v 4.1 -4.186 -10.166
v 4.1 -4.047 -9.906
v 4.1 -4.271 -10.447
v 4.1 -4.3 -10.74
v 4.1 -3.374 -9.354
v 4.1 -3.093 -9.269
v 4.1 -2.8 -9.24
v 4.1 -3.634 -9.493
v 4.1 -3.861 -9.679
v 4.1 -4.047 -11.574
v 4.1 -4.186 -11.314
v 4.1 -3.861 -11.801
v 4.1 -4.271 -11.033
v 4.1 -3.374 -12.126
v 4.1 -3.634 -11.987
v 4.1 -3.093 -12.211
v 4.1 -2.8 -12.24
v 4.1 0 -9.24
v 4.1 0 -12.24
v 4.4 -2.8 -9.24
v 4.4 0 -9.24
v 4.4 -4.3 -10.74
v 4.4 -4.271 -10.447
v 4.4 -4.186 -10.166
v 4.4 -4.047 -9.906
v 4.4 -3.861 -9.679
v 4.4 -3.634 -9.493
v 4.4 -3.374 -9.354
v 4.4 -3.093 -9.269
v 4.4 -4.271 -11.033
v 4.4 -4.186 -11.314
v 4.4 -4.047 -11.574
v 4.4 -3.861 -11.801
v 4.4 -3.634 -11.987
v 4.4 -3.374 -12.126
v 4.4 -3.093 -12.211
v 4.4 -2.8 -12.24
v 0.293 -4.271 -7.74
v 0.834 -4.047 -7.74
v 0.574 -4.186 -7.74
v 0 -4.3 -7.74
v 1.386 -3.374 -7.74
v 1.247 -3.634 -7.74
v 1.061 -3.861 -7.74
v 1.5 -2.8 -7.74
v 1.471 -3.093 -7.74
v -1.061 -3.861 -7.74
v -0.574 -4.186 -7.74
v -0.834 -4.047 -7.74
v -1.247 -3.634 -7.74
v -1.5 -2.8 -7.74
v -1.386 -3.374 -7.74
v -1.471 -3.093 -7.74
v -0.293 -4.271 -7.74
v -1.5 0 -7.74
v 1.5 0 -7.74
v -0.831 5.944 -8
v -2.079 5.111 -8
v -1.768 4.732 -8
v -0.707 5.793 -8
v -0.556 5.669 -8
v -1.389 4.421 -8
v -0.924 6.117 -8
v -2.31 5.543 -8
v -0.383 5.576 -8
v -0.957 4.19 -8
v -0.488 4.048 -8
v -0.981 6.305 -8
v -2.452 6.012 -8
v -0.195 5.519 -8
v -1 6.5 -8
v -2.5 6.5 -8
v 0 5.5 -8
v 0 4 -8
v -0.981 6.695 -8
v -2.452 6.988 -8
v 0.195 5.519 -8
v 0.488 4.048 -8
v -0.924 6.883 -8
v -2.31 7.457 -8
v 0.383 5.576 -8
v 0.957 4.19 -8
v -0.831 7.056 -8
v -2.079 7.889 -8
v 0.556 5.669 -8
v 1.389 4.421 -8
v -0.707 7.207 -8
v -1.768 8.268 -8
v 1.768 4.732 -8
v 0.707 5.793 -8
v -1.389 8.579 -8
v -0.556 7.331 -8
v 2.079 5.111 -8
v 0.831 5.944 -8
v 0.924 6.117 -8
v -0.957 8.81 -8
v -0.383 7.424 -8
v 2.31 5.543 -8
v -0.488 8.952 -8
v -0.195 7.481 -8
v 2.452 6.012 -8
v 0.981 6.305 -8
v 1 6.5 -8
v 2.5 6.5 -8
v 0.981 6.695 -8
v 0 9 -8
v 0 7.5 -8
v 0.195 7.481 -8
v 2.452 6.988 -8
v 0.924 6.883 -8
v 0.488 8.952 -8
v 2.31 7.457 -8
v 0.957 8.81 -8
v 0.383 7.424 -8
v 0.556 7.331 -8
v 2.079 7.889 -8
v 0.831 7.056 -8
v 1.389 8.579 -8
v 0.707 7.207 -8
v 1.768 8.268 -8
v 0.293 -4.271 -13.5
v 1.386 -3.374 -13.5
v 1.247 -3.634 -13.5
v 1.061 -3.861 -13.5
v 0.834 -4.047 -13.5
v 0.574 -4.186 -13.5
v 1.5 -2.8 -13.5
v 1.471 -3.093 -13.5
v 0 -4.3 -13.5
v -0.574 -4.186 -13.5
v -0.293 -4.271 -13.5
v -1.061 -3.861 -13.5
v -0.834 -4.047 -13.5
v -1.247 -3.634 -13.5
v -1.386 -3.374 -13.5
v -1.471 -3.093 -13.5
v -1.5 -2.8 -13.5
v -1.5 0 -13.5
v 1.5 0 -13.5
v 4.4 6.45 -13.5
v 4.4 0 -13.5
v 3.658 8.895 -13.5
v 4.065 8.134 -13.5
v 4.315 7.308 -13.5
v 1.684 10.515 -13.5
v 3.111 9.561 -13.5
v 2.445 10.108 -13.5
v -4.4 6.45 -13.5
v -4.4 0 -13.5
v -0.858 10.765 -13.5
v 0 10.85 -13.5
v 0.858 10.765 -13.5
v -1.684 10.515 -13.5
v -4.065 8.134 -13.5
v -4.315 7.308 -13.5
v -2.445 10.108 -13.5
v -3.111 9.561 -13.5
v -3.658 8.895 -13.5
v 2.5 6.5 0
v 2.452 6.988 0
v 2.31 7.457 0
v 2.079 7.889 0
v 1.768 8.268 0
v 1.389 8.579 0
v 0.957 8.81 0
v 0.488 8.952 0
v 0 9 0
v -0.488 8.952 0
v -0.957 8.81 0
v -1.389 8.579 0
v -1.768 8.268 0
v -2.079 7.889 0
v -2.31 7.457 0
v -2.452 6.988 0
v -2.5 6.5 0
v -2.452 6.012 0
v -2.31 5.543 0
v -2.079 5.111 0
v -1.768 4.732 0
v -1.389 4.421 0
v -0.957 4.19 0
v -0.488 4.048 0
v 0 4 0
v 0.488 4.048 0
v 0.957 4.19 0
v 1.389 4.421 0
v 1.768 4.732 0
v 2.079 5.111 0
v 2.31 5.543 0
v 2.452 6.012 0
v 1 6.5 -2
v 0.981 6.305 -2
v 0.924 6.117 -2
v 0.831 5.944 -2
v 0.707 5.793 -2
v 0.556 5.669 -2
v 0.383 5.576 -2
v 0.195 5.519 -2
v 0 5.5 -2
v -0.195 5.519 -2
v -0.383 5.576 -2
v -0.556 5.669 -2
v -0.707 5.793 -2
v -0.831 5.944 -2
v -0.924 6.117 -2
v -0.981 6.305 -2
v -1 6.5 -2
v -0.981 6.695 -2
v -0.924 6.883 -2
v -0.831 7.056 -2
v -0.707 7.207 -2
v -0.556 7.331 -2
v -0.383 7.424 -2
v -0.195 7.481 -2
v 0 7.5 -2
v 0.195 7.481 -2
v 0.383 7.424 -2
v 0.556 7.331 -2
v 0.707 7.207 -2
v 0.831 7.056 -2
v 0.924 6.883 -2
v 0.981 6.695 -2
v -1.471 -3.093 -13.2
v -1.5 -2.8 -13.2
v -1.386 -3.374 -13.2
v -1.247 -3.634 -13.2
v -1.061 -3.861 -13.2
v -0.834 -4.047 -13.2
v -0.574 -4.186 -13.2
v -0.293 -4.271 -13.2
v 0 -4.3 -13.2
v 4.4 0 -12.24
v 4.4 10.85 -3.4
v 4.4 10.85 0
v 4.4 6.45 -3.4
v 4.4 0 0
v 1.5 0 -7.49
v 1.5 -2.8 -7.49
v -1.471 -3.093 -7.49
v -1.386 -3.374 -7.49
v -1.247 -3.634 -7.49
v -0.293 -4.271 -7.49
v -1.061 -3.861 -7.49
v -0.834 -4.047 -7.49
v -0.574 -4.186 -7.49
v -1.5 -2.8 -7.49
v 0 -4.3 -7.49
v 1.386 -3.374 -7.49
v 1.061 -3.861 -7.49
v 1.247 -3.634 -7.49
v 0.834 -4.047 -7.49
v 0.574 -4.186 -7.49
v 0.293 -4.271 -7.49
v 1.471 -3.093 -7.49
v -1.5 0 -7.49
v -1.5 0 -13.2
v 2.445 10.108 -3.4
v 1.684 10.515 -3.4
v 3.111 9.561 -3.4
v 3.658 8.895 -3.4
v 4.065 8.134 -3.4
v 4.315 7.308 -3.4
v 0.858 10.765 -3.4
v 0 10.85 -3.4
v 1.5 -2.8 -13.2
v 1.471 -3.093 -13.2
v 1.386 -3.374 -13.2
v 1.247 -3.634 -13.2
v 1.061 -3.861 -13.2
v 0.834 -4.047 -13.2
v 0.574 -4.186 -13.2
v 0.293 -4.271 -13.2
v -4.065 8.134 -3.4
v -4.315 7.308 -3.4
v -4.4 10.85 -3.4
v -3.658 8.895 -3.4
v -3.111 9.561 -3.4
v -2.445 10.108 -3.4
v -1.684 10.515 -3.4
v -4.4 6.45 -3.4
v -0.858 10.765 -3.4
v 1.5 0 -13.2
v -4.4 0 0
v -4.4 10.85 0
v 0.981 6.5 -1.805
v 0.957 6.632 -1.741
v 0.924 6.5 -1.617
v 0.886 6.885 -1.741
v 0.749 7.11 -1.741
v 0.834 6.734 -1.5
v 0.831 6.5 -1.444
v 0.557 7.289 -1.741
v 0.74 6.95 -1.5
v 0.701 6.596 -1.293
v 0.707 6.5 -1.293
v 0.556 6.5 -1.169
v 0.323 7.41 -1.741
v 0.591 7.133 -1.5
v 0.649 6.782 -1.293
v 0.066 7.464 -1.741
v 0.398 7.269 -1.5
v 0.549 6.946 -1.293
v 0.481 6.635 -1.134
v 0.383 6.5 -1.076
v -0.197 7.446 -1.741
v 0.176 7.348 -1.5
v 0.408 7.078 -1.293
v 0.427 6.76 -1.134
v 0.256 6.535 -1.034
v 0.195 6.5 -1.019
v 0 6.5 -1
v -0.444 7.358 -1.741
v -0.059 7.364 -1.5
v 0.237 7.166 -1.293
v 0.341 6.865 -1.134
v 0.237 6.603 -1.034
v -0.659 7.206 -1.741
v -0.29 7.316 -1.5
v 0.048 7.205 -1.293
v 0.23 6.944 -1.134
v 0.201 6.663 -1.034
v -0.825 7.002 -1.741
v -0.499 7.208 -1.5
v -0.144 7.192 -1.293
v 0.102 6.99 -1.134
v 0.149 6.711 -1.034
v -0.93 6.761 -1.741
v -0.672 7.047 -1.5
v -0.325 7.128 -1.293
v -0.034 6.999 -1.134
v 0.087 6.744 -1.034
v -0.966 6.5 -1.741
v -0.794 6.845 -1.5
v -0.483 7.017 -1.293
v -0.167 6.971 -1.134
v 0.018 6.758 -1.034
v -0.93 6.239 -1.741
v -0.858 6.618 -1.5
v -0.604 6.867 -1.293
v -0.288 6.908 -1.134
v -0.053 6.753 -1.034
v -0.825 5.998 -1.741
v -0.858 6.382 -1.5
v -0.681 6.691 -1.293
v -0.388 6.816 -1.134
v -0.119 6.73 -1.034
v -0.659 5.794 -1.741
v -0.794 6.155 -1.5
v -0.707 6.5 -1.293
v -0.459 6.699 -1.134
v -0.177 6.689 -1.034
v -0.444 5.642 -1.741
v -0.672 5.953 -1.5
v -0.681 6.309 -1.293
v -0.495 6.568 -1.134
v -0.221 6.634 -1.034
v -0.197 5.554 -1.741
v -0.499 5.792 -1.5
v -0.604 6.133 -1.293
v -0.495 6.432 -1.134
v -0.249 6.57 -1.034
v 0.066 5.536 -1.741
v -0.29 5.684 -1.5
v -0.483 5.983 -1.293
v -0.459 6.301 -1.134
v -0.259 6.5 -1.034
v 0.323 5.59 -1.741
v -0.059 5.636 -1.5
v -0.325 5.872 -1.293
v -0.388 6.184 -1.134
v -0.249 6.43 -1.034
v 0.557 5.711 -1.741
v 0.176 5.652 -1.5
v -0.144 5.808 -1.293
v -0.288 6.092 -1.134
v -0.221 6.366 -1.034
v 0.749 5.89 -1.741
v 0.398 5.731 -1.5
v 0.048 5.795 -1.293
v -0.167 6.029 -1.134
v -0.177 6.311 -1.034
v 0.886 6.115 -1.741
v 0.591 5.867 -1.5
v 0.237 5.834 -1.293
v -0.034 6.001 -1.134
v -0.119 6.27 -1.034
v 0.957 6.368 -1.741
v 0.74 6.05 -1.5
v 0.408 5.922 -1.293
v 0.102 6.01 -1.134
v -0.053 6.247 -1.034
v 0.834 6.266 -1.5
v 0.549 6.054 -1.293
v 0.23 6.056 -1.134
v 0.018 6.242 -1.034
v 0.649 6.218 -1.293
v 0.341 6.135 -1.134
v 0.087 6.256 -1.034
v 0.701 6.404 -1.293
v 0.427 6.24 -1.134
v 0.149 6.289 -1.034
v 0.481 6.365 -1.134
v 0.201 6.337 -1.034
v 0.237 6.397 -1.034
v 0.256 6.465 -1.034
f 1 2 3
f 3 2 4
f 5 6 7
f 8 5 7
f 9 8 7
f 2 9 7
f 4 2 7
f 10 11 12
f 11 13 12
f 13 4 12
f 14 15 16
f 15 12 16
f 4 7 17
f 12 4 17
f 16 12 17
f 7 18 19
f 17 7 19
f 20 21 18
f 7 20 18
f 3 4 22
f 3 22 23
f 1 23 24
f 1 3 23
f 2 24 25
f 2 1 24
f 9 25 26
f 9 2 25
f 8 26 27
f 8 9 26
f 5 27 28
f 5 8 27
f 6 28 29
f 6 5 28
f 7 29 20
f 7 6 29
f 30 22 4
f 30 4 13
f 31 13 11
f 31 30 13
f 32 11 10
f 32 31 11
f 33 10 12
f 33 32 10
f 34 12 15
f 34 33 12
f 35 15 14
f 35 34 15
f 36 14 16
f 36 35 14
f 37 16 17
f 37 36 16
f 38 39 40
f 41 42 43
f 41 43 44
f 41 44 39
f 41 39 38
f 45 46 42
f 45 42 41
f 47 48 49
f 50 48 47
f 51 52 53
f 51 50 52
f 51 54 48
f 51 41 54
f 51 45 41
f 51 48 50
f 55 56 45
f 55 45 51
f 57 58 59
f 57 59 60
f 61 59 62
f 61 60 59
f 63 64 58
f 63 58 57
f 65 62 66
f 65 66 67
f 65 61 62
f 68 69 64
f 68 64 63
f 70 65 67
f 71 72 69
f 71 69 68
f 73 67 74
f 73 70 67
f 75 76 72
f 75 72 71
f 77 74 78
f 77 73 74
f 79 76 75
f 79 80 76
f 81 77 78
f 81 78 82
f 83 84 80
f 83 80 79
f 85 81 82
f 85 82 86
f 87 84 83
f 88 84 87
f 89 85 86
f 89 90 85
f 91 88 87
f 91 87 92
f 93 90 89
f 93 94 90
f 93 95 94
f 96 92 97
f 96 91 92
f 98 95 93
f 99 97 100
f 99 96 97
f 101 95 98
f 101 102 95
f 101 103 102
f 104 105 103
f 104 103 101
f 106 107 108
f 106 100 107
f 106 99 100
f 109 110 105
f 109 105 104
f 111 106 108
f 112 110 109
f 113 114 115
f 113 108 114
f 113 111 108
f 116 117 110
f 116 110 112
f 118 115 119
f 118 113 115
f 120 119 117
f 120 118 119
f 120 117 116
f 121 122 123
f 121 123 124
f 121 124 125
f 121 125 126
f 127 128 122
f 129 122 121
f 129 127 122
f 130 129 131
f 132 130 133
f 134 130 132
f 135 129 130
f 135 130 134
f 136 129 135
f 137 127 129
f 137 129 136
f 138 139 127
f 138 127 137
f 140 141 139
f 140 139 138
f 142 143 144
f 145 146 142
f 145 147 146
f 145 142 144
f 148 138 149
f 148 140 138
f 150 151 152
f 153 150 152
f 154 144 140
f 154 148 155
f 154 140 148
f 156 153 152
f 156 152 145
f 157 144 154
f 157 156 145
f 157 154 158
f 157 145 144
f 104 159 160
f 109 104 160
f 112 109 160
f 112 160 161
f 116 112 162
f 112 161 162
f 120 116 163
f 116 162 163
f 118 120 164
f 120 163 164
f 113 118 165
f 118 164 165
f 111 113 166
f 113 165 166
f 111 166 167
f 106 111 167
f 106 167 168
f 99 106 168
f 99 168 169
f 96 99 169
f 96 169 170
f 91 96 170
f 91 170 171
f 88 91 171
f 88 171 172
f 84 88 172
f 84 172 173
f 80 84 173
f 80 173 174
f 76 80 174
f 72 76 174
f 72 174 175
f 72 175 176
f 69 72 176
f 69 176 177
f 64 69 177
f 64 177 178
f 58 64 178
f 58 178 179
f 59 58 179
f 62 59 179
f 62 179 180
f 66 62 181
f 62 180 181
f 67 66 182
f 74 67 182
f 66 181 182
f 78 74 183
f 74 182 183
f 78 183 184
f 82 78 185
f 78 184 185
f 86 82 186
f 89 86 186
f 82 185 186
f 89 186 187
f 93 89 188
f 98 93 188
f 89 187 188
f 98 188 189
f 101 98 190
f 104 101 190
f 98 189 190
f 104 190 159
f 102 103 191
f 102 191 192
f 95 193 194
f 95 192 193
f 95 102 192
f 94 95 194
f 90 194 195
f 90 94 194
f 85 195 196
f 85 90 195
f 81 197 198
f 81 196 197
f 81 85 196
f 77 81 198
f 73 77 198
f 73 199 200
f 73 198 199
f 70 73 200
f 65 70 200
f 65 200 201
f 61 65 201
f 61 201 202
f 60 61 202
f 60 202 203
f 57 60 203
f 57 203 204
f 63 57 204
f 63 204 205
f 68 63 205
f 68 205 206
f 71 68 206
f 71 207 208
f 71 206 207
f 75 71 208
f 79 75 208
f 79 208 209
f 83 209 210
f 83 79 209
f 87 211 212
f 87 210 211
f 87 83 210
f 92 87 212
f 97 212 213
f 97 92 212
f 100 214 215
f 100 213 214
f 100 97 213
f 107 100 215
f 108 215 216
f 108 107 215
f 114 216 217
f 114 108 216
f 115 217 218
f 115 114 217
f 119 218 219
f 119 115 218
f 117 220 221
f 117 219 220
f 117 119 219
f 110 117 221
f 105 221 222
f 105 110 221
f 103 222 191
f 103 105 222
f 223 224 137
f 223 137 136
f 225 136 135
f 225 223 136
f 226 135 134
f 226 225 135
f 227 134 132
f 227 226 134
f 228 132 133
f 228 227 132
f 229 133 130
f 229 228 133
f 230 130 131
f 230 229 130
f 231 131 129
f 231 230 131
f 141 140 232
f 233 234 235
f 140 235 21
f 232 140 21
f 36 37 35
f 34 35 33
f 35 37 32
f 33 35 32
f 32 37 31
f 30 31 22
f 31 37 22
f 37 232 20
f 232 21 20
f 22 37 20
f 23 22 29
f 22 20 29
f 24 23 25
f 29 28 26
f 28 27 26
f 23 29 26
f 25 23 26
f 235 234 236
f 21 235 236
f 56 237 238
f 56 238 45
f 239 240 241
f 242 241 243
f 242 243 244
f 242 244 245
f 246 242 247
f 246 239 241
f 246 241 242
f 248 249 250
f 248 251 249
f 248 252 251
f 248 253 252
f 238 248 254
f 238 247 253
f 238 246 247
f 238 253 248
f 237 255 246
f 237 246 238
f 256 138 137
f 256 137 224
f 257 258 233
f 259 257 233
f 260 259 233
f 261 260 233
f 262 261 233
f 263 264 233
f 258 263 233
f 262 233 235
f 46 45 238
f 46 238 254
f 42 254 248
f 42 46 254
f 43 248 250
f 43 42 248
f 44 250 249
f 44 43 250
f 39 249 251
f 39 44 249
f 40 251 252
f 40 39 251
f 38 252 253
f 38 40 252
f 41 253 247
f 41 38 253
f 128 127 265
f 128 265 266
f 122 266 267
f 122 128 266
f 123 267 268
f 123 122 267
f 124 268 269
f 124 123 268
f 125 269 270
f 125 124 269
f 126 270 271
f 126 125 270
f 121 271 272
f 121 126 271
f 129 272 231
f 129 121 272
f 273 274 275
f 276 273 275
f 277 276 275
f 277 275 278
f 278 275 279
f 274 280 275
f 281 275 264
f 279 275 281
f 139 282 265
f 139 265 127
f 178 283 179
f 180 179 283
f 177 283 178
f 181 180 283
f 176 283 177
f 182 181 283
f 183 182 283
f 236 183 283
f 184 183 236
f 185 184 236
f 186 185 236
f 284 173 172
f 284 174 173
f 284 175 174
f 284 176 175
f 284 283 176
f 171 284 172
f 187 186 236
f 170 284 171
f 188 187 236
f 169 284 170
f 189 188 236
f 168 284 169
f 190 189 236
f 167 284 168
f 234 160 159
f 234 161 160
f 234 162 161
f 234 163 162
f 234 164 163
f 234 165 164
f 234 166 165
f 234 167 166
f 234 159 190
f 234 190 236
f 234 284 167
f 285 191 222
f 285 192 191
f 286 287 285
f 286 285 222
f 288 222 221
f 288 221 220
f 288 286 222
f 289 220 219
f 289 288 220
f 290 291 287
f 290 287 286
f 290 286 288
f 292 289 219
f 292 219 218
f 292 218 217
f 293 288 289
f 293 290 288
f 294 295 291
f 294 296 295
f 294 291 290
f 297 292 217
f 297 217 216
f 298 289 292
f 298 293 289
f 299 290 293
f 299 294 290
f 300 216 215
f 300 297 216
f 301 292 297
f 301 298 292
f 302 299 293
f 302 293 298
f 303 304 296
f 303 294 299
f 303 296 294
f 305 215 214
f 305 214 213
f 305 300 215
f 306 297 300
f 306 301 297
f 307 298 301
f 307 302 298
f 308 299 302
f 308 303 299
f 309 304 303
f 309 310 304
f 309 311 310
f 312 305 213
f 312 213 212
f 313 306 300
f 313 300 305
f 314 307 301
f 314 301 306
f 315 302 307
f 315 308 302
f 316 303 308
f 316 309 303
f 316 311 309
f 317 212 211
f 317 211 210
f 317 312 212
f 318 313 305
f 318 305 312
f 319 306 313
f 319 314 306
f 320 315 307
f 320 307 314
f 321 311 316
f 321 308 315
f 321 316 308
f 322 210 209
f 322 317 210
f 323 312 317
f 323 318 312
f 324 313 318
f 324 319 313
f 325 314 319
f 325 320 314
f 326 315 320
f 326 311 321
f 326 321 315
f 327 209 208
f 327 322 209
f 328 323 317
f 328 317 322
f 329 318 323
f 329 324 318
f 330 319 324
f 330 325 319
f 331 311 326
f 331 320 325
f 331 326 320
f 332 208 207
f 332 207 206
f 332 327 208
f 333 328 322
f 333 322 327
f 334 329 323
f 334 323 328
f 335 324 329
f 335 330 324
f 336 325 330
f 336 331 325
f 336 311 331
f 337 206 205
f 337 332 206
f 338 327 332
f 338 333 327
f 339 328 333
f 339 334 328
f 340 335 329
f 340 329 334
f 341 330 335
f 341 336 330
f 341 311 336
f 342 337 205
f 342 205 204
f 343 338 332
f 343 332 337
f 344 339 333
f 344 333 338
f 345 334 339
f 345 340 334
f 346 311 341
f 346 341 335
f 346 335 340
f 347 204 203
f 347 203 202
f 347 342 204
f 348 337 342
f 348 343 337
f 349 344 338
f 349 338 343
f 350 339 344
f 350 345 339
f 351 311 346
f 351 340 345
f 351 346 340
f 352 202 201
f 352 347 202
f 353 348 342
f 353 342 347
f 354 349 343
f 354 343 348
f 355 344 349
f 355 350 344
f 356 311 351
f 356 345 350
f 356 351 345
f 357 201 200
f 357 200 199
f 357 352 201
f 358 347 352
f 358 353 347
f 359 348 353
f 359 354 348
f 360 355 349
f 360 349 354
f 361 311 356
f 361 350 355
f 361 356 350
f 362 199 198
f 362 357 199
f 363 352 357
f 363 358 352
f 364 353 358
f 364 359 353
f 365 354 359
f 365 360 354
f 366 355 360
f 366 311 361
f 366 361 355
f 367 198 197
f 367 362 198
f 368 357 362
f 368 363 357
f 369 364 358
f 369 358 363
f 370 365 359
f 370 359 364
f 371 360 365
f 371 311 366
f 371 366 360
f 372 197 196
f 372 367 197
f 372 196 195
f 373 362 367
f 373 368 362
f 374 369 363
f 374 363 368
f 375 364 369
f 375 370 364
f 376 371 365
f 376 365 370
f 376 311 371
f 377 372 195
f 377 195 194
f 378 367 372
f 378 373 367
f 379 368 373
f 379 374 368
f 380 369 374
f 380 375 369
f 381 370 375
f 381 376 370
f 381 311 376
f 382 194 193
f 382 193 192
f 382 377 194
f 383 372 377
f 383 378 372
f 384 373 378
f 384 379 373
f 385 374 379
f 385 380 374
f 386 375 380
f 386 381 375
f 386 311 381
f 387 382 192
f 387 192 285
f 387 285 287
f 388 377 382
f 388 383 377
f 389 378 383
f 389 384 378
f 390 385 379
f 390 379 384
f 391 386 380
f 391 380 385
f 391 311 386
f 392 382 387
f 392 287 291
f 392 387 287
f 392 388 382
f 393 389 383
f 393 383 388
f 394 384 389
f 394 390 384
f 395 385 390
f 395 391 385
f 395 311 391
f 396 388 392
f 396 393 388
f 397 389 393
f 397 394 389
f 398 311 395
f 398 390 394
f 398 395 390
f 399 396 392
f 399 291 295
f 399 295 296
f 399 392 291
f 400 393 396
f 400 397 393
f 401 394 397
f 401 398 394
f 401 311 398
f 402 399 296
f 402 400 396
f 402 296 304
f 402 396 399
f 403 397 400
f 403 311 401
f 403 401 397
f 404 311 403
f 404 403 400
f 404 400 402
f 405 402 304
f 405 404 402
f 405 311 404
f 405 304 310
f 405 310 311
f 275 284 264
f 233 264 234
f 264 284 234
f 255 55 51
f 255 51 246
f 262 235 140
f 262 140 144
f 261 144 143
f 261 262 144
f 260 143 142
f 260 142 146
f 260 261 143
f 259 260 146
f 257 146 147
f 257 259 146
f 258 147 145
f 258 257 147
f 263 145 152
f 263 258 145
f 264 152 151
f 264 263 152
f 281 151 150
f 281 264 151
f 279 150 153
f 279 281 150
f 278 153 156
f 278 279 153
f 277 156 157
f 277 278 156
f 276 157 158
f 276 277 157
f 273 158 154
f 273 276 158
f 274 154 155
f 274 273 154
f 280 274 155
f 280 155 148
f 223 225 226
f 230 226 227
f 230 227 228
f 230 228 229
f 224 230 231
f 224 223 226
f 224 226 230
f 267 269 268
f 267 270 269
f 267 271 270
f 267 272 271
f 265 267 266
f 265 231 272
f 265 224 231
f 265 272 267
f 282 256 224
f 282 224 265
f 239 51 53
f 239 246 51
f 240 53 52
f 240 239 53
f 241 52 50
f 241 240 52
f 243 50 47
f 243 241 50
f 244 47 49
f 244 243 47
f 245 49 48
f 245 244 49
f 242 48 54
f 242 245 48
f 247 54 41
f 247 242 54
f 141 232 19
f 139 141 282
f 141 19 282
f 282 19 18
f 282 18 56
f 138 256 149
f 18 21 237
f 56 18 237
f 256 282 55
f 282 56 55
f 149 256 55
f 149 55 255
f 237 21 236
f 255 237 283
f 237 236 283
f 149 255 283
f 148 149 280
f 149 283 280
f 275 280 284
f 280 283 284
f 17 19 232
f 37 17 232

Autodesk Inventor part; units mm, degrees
ref_plane "YZ Plane" through (0, 0, 0) normal (1, 0, 0) x (0, 1, 0)
ref_plane "XZ Plane" through (0, 0, 0) normal (0, 1, 0) x (-1, 0, 0)
ref_plane "XY Plane" through (0, 0, 0) normal (0, 0, 1) x (1, 0, 0)
sketch "Sketch1" plane through (0, 0, 0) normal (0, 0, 1) x (1, 0, 0)
  line L0 (-4.4, 10.85) -> (4.4, 10.85)
  line L1 (4.4, 10.85) -> (4.4, 0)
  line L2 (4.4, 0) -> (-4.4, 0)
  line L3 (-4.4, 0) -> (-4.4, 10.85)
  point P0 (0, 0)
  dimension "d0" = 8.8
  dimension "d1" = 4.4
  dimension "d2" = 0
  dimension "d3" = 10.85
extrude "Extrusion1" add sketch "Sketch1" against normal blind 3.4
sketch "Sketch2" plane through (0, 0, -3.4) normal (0, 0, -1) x (-1, 0, 0)
  line L0 (-4.4, 10.85) -> (-4.4, 0) projected
  line L1 (-4.4, 6.45) -> (-4.4, 5.425)
  line L2 (4.4, 10.85) -> (-4.4, 10.85) projected
  line L3 (4.4, 0) -> (4.4, 10.85) projected
  line L4 (4.4, 6.45) -> (4.4, 4.887)
  arc A0 (4.4, 6.45) -> (-4.4, 6.45) centre (0, 6.45) ccw
  line L5 (-4.4, 0) -> (4.4, 0) projected
  line L6 (-4.4, 5.425) -> (-4.4, 0)
  line L7 (-4.4, 0) -> (4.4, 0)
  line L8 (4.4, 0) -> (4.4, 4.887)
  point P0 (0, 0)
extrude "Extrusion2" add sketch "Sketch2" along normal blind 10.1 contours A0 L3 L5 L0
sketch "Sketch3" plane through (0, 0, 0) normal (0, 0, 1) x (1, 0, 0)
  circle A0 centre (0, 6.5) radius 2.5
  line L0 (-4.4, 10.85) -> (4.4, 10.85) projected
  point P0 (0, 0)
  dimension "d8" = 4.35
  dimension "d9" = 5
extrude "Extrusion3" cut sketch "Sketch3" against normal blind 8
sketch "Sketch4" plane through (-4.4, 0, 0) normal (0, -1, 0) x (1, 0, 0)
  line L0 (8.8, -3.4) -> (8.8, -13.5) projected
  line L1 (8.8, -9.6102) -> (8.8, -6.6102)
  line L2 (0, -13.5) -> (8.8, -13.5) projected
  line L3 (5.9, -13.5) -> (2.9, -13.5)
  line L4 (2.9, -13.5) -> (2.9, -13.2)
  line L5 (2.9, -13.2) -> (5.9, -13.2)
  line L6 (5.9, -13.2) -> (5.9, -13.5)
  line L7 (8.5, -12.24) -> (8.8, -12.24)
  line L8 (8.8, -12.24) -> (8.8, -9.24)
  line L9 (8.8, -9.24) -> (8.5, -9.24)
  line L10 (8.5, -9.24) -> (8.5, -12.24)
  line L11 (2.9, -7.49) -> (5.9, -7.49)
  line L12 (5.9, -7.49) -> (5.9, -7.74)
  line L13 (5.9, -7.74) -> (2.9, -7.74)
  line L14 (2.9, -7.74) -> (2.9, -7.49)
  line L15 (8.8, 0) -> (0, 0) projected
  point P0 (4.4, 0)
  dimension "d12" = 3
  dimension "d14" = 3
  dimension "d15" = 1.5
  dimension "d16" = 3
  dimension "d17" = 1.5
  dimension "d18" = 0.3
  dimension "d19" = 0.25
  dimension "d20" = 0.3
  dimension "d22" = 9.24
  dimension "d24" = 7.49
  dimension "d28" = 0
extrude "Extrusion4" add sketch "Sketch4" along normal blind 4.3
fillet "Fillet1" radius 1.5 6 edges at (4.25, -4.3, -9.24) (4.25, -4.3, -12.24) (-1.5, -4.3, -7.615) (1.5, -4.3, -7.615) (-1.5, -4.3, -13.35) (1.5, -4.3, -13.35)
sketch "Sketch5" plane through (0, 6.5, -8) normal (0, 0, 1) x (1, 0, 0)
  circle A0 centre (0, 0) radius 1
  point P0 (0, -6.5)
  dimension "d29" = 2
extrude "Extrusion5" add sketch "Sketch5" along normal blind 7
fillet "Fillet2" radius 1 1 edges at (-1, 6.5, -1)
properties part number "5mm_BarrelJack"
